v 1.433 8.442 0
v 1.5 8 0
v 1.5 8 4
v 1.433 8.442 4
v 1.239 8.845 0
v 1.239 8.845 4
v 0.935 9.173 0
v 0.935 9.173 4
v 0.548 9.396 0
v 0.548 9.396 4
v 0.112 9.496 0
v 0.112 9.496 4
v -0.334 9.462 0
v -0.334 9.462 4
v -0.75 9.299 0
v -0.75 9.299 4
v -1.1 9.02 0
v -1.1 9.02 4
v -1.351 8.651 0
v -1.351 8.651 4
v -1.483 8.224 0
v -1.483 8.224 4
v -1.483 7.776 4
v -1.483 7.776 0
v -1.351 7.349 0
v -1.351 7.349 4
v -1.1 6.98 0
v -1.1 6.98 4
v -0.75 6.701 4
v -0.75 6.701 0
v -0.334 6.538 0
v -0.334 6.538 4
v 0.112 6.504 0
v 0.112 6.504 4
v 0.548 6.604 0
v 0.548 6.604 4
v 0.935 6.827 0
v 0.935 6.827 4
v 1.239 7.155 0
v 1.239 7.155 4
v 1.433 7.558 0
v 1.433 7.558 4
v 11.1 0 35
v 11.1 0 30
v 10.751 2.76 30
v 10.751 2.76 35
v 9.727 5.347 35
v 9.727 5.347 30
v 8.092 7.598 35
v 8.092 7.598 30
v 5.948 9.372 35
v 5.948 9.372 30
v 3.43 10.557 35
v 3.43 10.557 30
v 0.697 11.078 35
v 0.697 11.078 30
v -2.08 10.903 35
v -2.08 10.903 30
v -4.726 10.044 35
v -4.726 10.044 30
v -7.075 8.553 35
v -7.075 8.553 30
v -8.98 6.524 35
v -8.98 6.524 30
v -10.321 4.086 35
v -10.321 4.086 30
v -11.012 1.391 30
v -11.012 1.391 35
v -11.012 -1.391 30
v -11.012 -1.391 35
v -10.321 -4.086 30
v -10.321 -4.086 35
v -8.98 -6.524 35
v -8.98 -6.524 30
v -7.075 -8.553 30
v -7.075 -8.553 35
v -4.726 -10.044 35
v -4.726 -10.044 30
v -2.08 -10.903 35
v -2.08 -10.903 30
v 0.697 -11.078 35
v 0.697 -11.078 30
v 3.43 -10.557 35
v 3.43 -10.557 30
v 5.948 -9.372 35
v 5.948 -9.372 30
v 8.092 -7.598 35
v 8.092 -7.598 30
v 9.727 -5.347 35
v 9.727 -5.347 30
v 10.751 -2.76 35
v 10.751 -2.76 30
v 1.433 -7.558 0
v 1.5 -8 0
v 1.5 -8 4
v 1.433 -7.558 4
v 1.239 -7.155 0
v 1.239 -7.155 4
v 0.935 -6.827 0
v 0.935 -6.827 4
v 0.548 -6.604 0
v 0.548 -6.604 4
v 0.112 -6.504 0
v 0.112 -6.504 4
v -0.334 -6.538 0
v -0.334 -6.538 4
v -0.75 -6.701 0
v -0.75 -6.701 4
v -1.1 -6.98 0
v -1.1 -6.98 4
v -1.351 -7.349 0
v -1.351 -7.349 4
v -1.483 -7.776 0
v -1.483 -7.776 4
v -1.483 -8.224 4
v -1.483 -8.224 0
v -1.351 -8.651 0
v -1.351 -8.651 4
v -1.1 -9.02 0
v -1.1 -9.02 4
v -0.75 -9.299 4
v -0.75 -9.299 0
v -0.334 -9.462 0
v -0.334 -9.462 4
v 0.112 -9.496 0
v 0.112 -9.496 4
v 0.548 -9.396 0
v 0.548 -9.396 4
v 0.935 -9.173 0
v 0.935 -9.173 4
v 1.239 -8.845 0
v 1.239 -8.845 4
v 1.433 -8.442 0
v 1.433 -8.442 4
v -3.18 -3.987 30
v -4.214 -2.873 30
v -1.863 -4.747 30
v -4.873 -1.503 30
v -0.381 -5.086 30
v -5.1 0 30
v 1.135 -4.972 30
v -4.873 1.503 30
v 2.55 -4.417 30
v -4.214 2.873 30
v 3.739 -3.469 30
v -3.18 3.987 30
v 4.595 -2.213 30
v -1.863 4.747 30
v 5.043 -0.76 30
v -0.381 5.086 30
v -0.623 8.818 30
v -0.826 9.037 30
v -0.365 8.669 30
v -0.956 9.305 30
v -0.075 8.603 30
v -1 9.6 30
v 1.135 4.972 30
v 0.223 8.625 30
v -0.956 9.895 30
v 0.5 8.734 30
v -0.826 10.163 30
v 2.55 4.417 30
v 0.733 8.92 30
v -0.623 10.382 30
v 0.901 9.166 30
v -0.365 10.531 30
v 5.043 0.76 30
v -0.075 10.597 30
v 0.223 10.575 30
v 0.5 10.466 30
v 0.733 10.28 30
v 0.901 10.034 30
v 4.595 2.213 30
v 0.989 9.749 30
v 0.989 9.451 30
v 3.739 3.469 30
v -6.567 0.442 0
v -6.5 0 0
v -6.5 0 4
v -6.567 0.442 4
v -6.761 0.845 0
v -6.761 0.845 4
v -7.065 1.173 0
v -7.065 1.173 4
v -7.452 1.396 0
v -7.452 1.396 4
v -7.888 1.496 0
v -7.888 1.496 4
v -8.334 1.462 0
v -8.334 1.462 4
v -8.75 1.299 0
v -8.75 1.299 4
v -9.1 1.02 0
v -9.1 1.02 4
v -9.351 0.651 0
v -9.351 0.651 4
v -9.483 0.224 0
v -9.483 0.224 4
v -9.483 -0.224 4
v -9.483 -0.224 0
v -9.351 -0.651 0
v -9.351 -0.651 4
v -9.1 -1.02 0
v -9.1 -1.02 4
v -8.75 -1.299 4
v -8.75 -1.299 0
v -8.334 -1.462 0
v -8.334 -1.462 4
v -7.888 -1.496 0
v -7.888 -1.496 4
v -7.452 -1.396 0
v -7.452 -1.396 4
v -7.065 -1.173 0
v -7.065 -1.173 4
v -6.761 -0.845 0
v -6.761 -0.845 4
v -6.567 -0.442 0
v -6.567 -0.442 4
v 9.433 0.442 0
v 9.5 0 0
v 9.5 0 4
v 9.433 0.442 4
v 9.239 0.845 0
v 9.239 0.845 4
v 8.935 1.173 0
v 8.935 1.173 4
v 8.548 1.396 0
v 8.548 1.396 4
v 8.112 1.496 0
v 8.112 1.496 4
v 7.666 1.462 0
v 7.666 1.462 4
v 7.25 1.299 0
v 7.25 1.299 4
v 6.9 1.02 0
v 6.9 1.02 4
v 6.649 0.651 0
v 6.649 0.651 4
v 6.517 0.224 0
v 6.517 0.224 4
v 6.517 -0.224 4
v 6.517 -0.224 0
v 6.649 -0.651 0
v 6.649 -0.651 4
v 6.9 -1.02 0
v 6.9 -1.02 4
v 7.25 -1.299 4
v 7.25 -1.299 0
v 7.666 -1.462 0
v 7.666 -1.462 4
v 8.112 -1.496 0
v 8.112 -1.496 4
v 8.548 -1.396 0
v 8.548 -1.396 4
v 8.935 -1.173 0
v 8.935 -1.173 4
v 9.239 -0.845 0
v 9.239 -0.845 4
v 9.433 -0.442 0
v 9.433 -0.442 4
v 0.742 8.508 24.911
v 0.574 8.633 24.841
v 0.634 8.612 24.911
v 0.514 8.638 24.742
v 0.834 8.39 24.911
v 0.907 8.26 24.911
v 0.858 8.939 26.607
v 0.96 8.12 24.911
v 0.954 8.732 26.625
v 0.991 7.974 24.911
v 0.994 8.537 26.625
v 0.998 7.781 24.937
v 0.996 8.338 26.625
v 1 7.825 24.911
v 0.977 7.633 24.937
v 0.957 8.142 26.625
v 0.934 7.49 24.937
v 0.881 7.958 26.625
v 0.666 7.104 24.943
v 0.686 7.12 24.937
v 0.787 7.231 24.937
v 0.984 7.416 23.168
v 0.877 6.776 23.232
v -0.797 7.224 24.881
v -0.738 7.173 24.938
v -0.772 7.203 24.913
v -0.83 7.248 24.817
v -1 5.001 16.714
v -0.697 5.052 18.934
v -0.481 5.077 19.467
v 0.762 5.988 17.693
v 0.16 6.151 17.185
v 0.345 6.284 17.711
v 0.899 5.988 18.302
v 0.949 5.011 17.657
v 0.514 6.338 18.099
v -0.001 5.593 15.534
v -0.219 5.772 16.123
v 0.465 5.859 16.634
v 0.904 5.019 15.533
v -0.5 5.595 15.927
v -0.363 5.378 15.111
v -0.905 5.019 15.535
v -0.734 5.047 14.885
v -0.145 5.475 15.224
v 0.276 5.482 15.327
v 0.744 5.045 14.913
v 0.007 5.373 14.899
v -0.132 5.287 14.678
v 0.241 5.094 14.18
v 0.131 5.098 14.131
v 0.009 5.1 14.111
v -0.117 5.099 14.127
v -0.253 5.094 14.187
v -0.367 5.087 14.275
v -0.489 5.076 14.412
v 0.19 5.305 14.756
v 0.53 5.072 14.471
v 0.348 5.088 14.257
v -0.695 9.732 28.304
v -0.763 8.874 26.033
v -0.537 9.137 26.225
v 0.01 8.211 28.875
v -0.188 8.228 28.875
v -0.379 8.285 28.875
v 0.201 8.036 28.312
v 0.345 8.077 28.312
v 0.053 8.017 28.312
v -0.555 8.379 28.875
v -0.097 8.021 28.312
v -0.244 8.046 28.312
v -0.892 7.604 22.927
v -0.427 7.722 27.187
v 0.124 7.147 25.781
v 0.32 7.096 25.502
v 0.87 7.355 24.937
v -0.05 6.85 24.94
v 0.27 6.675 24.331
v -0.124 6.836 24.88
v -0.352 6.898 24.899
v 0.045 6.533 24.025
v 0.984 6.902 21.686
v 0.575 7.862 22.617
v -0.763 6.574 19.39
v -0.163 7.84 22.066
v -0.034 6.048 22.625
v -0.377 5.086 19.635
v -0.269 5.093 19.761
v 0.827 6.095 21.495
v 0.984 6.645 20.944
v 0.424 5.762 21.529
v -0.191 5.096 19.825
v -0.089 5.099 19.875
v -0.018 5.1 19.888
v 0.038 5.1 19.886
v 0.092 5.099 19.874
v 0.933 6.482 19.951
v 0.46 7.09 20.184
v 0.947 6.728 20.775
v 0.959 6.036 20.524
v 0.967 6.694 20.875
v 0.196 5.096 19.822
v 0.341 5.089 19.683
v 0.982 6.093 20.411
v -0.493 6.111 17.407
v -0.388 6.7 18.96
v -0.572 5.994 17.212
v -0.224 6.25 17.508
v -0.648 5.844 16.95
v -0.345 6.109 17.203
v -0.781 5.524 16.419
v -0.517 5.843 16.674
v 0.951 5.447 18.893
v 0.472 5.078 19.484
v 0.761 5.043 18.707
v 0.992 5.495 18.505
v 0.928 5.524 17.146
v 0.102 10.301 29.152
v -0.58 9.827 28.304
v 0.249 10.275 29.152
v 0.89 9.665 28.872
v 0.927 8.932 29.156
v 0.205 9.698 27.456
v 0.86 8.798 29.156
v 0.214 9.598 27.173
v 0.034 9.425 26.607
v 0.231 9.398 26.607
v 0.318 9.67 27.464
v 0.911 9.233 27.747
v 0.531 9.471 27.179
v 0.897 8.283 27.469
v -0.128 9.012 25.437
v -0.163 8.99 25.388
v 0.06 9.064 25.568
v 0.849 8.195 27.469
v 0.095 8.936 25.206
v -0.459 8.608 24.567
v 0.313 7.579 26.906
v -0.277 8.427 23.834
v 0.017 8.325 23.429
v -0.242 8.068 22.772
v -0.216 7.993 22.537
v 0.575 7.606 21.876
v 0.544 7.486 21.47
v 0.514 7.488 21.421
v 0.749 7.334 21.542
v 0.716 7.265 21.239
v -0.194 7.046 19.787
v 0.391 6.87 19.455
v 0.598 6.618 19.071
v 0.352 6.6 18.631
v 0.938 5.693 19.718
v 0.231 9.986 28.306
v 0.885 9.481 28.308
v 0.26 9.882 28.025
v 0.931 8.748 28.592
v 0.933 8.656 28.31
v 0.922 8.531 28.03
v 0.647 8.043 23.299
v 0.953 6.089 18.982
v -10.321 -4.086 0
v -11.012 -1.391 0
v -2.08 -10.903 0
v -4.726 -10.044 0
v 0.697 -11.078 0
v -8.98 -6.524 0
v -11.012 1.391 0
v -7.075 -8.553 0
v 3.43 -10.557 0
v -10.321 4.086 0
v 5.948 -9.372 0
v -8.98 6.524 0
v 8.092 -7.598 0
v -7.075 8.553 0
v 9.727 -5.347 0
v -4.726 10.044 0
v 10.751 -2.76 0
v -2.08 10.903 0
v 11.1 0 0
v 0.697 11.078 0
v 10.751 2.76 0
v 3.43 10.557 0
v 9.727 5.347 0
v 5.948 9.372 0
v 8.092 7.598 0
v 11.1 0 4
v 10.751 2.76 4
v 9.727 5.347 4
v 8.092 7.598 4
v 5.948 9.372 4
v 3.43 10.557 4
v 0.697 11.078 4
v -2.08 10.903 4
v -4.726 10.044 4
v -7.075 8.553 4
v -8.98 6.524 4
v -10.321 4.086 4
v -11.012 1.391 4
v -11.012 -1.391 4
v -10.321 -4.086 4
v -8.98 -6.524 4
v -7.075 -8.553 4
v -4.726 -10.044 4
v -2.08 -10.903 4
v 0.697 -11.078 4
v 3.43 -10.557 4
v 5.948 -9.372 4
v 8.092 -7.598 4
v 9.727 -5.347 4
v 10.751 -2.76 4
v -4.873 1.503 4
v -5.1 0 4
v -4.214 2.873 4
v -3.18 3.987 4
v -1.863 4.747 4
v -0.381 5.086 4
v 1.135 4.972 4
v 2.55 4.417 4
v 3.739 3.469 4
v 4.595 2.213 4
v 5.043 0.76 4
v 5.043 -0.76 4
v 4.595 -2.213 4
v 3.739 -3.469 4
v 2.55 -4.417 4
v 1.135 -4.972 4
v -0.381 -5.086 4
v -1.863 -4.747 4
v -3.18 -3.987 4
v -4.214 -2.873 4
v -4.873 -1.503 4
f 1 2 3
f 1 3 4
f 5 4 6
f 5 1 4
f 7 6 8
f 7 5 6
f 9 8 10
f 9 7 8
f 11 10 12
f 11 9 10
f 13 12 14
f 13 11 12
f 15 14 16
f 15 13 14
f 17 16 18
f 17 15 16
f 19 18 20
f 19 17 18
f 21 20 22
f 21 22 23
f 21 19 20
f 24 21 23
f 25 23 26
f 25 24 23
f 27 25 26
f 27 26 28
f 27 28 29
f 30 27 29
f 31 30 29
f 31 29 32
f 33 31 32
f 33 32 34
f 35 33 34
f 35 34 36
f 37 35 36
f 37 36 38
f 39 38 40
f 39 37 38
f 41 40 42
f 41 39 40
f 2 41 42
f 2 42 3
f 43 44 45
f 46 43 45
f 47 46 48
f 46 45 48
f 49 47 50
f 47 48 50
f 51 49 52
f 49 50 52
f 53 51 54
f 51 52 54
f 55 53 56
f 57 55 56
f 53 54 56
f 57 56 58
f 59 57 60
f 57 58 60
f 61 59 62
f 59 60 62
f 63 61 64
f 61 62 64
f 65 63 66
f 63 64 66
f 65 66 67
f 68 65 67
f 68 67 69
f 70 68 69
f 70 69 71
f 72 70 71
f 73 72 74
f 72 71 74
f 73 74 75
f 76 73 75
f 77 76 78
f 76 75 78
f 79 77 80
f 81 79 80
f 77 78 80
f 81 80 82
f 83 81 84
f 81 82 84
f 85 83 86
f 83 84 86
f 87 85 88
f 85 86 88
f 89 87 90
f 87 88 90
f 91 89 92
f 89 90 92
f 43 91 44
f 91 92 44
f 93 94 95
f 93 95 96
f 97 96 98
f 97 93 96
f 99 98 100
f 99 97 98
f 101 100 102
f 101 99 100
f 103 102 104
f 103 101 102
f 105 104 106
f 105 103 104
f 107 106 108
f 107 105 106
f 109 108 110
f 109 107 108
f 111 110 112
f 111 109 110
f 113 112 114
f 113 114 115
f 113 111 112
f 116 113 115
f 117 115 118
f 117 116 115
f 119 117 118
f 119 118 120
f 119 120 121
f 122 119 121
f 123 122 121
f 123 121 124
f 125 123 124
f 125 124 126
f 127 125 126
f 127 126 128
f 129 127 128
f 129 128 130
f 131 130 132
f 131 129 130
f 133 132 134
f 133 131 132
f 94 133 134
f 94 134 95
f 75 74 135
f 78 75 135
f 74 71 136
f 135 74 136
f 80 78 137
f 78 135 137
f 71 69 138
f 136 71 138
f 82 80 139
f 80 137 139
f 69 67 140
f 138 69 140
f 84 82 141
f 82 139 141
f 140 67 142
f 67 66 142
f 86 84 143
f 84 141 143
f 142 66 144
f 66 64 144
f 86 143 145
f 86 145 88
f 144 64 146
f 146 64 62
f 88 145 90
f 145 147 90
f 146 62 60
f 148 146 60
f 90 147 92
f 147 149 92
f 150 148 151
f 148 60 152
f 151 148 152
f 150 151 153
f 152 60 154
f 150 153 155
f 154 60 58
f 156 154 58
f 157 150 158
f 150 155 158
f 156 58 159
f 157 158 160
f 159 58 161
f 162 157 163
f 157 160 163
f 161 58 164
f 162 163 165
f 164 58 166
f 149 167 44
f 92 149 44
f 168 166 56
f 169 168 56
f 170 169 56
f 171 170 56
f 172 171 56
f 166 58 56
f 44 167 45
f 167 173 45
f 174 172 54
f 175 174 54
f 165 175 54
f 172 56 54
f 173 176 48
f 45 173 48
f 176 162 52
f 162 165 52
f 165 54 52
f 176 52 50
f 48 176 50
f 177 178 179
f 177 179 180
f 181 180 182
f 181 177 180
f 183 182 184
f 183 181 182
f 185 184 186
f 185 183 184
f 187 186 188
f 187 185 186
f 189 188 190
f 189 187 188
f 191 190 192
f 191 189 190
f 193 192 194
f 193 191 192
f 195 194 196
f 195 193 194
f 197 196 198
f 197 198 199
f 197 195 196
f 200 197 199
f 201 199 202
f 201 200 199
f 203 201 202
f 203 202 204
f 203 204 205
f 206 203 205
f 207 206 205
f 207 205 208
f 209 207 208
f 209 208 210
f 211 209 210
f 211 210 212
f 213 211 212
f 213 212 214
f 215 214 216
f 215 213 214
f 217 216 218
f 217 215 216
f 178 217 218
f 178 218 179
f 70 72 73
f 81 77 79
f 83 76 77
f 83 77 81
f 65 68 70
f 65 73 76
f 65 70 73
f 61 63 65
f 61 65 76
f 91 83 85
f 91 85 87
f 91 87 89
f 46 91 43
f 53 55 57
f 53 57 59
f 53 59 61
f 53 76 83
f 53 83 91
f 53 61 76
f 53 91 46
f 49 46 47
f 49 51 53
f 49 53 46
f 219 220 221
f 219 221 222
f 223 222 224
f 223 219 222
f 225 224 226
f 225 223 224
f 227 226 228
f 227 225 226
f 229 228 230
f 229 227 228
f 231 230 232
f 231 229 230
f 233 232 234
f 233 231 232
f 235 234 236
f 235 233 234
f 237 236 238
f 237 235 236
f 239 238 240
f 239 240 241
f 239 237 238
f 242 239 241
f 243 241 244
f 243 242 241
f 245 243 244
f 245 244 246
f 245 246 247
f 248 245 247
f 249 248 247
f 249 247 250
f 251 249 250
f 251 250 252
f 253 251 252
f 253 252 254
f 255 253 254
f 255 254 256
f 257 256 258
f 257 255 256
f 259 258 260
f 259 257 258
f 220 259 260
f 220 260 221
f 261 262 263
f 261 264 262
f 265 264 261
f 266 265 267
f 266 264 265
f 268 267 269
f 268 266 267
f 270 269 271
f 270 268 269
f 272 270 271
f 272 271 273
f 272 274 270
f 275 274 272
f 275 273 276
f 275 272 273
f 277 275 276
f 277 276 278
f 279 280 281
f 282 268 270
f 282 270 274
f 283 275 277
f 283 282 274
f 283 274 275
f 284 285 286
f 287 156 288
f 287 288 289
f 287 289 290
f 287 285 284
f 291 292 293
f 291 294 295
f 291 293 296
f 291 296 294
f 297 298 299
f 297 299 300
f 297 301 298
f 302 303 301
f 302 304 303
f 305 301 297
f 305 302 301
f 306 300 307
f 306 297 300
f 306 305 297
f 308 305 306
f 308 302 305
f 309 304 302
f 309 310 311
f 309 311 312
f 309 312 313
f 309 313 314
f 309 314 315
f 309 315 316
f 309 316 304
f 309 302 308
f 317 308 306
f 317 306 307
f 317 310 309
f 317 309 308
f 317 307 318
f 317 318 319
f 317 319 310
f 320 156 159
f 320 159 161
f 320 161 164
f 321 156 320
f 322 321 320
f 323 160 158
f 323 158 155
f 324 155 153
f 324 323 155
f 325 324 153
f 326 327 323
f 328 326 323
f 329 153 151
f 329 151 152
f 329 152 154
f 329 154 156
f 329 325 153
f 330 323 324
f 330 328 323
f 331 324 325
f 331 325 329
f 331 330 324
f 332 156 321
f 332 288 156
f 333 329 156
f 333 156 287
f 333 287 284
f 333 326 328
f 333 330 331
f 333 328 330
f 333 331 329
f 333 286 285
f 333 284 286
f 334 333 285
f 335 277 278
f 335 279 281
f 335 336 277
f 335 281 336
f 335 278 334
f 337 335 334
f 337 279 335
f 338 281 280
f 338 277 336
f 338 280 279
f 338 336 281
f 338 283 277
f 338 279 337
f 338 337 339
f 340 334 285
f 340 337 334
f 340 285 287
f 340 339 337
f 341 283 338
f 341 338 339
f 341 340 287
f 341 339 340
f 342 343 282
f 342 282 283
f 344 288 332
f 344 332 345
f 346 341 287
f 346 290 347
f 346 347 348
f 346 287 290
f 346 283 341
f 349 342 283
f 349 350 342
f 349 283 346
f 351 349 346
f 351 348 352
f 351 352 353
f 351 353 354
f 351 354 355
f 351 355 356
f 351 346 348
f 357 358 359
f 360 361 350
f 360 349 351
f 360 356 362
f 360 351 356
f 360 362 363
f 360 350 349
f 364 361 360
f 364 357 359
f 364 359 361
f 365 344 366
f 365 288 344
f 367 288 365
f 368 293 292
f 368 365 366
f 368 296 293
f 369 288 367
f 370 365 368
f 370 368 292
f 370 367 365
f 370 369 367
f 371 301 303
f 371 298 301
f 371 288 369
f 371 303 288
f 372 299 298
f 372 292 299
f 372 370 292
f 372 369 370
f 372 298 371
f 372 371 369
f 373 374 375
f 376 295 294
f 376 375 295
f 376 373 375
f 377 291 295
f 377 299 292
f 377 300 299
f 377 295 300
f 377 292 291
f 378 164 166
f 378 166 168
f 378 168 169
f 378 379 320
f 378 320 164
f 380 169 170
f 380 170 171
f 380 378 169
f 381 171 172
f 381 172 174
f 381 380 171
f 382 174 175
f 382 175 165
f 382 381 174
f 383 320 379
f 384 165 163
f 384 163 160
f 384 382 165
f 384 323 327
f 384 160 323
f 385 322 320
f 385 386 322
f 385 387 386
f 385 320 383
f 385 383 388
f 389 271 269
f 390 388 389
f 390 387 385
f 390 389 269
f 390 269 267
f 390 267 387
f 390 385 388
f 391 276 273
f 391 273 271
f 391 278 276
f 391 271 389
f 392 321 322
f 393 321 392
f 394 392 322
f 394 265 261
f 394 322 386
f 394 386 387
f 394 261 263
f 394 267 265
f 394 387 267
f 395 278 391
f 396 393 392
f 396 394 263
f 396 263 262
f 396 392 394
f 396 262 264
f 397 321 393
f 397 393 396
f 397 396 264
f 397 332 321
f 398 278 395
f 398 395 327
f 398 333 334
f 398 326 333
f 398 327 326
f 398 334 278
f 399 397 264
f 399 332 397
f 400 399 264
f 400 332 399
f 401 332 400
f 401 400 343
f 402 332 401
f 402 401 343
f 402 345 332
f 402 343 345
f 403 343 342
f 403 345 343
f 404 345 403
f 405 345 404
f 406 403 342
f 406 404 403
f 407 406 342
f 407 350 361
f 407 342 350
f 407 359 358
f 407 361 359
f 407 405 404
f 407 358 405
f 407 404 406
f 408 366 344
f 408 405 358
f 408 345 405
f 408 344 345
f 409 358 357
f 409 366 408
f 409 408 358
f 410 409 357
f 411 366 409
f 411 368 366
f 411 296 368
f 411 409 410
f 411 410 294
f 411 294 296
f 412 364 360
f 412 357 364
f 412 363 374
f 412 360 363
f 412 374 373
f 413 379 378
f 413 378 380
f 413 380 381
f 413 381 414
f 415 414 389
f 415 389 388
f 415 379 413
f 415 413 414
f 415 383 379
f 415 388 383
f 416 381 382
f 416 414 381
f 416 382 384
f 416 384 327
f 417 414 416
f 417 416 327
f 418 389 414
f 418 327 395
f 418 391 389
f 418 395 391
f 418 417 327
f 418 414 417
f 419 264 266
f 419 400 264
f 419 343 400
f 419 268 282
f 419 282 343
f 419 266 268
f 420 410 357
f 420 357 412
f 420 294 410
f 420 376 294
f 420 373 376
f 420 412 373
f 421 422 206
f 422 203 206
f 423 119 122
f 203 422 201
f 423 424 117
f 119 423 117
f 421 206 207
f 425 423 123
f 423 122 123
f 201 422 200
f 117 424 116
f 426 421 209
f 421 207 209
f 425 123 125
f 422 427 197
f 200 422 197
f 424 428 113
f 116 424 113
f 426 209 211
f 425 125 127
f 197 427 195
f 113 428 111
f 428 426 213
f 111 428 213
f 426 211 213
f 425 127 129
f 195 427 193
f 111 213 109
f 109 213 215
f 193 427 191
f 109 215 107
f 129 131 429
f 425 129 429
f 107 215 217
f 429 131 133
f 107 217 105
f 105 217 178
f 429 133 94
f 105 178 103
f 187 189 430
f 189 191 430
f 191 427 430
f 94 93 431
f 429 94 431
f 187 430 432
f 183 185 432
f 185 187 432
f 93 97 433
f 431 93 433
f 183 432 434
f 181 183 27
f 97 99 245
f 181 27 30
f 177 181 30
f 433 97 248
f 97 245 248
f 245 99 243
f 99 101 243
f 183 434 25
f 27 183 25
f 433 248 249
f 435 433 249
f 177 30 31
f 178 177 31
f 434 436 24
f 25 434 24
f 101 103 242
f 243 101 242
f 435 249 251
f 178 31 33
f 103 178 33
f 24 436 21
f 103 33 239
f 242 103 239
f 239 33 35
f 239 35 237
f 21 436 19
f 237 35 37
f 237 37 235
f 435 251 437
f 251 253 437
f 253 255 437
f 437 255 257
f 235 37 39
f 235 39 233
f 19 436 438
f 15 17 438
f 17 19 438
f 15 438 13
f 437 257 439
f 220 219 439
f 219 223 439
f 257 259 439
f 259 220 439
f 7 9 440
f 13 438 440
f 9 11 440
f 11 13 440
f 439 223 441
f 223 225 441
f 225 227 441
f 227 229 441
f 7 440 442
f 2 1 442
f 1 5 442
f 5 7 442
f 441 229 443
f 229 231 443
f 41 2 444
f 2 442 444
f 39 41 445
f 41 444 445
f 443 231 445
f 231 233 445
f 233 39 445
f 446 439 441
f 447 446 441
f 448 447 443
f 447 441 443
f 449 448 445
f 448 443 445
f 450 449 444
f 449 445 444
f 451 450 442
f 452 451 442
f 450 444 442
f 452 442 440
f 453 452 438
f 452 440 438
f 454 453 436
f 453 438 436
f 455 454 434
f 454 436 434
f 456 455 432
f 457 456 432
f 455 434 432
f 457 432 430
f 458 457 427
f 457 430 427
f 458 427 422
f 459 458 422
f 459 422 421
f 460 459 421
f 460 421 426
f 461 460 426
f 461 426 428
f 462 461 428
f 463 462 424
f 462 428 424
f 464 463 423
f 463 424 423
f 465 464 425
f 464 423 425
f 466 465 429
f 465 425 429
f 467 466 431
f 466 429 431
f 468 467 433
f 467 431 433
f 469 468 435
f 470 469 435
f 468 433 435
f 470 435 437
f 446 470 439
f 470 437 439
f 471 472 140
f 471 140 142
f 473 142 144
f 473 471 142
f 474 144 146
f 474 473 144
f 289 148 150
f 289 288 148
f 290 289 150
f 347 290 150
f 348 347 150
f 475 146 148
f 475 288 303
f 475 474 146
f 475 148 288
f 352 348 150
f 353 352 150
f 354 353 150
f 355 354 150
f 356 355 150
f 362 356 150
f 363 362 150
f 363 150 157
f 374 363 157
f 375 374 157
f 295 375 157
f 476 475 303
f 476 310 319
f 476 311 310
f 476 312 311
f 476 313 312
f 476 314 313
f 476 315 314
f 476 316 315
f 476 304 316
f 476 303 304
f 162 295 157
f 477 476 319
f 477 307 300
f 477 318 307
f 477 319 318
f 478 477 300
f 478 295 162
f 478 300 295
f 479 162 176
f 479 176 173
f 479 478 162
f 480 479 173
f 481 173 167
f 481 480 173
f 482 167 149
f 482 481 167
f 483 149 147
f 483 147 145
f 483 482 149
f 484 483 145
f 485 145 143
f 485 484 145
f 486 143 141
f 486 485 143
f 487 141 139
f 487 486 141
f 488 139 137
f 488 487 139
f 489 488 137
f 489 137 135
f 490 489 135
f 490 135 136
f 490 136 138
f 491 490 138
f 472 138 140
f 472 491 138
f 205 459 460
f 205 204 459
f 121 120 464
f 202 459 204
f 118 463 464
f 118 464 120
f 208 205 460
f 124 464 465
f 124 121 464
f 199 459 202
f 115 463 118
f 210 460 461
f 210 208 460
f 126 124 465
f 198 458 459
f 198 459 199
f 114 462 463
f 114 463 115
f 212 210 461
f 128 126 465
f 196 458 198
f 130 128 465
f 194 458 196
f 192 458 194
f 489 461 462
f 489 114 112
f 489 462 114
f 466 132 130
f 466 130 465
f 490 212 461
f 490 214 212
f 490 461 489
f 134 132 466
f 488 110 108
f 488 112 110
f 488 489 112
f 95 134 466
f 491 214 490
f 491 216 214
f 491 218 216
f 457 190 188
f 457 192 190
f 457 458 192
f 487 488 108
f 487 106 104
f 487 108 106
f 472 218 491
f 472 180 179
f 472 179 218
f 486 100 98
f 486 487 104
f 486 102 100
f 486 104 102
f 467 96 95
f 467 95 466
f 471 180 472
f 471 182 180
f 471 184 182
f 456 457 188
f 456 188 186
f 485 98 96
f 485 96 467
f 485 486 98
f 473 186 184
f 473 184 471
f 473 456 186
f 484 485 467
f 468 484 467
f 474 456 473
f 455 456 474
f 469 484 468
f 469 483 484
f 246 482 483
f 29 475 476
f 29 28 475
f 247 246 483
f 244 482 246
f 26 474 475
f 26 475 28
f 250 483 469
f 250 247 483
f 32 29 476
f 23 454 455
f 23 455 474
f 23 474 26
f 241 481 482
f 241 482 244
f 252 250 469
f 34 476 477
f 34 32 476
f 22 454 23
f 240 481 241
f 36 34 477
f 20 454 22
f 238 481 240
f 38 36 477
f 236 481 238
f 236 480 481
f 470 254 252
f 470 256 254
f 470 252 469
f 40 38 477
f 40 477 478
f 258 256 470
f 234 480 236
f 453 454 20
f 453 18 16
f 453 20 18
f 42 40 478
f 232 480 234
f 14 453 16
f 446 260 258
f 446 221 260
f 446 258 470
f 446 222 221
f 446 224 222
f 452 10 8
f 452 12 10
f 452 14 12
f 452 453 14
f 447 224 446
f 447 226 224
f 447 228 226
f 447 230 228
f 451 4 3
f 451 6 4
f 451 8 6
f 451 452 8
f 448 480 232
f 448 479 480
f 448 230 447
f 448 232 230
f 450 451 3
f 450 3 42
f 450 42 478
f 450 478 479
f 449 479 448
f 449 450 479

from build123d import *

# Parameters (mm, degrees)
SKETCH3_R           = 11.1
SKETCH3_R_2         = 5.1
SKETCH3_R_3         = 1.5
BOSS_EXTRUDE5_DEPTH = 4
SKETCH16_R          = 5.1
BOSS_EXTRUDE6_DEPTH = 30
SKETCH17_R          = 11.1
BOSS_EXTRUDE8_DEPTH = 5
SKETCH19_R          = 1


with BuildPart() as part:
    # Sketch3 → Boss-Extrude5 (new body)
    with BuildSketch(Plane.XY):
        Circle(SKETCH3_R)
        Circle(SKETCH3_R_2, mode=Mode.SUBTRACT)
        with Locations((0, 8)):
            Circle(SKETCH3_R_3, mode=Mode.SUBTRACT)
        with Locations((8, 0)):
            Circle(SKETCH3_R_3, mode=Mode.SUBTRACT)
        with Locations((0, -8)):
            Circle(SKETCH3_R_3, mode=Mode.SUBTRACT)
        with Locations((-8, 0)):
            Circle(SKETCH3_R_3, mode=Mode.SUBTRACT)
    extrude(amount=BOSS_EXTRUDE5_DEPTH)

    # Sketch16 → Boss-Extrude6 (add)
    with BuildSketch(Plane(origin=(0, 0, 0), x_dir=(-1, 0, 0), z_dir=(0, 0, -1))):
        Circle(SKETCH16_R)
    extrude(amount=-BOSS_EXTRUDE6_DEPTH)

    # Sketch17 → Boss-Extrude8 (add)
    with BuildSketch(Plane.XY.offset(30)):
        Circle(SKETCH17_R)
    extrude(amount=BOSS_EXTRUDE8_DEPTH)

    # Sweep1: sweep along a path in Sketch20
    with BuildLine(Plane(origin=(0, 0, 0), x_dir=(0, 0, -1), z_dir=(1, 0, 0))) as sweep1_path:
        Line((-30, 9.6), (-12.990250678, 3.71200985))
    # Sketch19 → Sweep1 (sweep)
    with BuildSketch(Plane(origin=(0, 0, 30), x_dir=(-1, 0, 0), z_dir=(0, 0, -1))):
        with Locations((0, 9.6)):
            Circle(SKETCH19_R)
    sweep(path=sweep1_path.line)


solid = part.part
